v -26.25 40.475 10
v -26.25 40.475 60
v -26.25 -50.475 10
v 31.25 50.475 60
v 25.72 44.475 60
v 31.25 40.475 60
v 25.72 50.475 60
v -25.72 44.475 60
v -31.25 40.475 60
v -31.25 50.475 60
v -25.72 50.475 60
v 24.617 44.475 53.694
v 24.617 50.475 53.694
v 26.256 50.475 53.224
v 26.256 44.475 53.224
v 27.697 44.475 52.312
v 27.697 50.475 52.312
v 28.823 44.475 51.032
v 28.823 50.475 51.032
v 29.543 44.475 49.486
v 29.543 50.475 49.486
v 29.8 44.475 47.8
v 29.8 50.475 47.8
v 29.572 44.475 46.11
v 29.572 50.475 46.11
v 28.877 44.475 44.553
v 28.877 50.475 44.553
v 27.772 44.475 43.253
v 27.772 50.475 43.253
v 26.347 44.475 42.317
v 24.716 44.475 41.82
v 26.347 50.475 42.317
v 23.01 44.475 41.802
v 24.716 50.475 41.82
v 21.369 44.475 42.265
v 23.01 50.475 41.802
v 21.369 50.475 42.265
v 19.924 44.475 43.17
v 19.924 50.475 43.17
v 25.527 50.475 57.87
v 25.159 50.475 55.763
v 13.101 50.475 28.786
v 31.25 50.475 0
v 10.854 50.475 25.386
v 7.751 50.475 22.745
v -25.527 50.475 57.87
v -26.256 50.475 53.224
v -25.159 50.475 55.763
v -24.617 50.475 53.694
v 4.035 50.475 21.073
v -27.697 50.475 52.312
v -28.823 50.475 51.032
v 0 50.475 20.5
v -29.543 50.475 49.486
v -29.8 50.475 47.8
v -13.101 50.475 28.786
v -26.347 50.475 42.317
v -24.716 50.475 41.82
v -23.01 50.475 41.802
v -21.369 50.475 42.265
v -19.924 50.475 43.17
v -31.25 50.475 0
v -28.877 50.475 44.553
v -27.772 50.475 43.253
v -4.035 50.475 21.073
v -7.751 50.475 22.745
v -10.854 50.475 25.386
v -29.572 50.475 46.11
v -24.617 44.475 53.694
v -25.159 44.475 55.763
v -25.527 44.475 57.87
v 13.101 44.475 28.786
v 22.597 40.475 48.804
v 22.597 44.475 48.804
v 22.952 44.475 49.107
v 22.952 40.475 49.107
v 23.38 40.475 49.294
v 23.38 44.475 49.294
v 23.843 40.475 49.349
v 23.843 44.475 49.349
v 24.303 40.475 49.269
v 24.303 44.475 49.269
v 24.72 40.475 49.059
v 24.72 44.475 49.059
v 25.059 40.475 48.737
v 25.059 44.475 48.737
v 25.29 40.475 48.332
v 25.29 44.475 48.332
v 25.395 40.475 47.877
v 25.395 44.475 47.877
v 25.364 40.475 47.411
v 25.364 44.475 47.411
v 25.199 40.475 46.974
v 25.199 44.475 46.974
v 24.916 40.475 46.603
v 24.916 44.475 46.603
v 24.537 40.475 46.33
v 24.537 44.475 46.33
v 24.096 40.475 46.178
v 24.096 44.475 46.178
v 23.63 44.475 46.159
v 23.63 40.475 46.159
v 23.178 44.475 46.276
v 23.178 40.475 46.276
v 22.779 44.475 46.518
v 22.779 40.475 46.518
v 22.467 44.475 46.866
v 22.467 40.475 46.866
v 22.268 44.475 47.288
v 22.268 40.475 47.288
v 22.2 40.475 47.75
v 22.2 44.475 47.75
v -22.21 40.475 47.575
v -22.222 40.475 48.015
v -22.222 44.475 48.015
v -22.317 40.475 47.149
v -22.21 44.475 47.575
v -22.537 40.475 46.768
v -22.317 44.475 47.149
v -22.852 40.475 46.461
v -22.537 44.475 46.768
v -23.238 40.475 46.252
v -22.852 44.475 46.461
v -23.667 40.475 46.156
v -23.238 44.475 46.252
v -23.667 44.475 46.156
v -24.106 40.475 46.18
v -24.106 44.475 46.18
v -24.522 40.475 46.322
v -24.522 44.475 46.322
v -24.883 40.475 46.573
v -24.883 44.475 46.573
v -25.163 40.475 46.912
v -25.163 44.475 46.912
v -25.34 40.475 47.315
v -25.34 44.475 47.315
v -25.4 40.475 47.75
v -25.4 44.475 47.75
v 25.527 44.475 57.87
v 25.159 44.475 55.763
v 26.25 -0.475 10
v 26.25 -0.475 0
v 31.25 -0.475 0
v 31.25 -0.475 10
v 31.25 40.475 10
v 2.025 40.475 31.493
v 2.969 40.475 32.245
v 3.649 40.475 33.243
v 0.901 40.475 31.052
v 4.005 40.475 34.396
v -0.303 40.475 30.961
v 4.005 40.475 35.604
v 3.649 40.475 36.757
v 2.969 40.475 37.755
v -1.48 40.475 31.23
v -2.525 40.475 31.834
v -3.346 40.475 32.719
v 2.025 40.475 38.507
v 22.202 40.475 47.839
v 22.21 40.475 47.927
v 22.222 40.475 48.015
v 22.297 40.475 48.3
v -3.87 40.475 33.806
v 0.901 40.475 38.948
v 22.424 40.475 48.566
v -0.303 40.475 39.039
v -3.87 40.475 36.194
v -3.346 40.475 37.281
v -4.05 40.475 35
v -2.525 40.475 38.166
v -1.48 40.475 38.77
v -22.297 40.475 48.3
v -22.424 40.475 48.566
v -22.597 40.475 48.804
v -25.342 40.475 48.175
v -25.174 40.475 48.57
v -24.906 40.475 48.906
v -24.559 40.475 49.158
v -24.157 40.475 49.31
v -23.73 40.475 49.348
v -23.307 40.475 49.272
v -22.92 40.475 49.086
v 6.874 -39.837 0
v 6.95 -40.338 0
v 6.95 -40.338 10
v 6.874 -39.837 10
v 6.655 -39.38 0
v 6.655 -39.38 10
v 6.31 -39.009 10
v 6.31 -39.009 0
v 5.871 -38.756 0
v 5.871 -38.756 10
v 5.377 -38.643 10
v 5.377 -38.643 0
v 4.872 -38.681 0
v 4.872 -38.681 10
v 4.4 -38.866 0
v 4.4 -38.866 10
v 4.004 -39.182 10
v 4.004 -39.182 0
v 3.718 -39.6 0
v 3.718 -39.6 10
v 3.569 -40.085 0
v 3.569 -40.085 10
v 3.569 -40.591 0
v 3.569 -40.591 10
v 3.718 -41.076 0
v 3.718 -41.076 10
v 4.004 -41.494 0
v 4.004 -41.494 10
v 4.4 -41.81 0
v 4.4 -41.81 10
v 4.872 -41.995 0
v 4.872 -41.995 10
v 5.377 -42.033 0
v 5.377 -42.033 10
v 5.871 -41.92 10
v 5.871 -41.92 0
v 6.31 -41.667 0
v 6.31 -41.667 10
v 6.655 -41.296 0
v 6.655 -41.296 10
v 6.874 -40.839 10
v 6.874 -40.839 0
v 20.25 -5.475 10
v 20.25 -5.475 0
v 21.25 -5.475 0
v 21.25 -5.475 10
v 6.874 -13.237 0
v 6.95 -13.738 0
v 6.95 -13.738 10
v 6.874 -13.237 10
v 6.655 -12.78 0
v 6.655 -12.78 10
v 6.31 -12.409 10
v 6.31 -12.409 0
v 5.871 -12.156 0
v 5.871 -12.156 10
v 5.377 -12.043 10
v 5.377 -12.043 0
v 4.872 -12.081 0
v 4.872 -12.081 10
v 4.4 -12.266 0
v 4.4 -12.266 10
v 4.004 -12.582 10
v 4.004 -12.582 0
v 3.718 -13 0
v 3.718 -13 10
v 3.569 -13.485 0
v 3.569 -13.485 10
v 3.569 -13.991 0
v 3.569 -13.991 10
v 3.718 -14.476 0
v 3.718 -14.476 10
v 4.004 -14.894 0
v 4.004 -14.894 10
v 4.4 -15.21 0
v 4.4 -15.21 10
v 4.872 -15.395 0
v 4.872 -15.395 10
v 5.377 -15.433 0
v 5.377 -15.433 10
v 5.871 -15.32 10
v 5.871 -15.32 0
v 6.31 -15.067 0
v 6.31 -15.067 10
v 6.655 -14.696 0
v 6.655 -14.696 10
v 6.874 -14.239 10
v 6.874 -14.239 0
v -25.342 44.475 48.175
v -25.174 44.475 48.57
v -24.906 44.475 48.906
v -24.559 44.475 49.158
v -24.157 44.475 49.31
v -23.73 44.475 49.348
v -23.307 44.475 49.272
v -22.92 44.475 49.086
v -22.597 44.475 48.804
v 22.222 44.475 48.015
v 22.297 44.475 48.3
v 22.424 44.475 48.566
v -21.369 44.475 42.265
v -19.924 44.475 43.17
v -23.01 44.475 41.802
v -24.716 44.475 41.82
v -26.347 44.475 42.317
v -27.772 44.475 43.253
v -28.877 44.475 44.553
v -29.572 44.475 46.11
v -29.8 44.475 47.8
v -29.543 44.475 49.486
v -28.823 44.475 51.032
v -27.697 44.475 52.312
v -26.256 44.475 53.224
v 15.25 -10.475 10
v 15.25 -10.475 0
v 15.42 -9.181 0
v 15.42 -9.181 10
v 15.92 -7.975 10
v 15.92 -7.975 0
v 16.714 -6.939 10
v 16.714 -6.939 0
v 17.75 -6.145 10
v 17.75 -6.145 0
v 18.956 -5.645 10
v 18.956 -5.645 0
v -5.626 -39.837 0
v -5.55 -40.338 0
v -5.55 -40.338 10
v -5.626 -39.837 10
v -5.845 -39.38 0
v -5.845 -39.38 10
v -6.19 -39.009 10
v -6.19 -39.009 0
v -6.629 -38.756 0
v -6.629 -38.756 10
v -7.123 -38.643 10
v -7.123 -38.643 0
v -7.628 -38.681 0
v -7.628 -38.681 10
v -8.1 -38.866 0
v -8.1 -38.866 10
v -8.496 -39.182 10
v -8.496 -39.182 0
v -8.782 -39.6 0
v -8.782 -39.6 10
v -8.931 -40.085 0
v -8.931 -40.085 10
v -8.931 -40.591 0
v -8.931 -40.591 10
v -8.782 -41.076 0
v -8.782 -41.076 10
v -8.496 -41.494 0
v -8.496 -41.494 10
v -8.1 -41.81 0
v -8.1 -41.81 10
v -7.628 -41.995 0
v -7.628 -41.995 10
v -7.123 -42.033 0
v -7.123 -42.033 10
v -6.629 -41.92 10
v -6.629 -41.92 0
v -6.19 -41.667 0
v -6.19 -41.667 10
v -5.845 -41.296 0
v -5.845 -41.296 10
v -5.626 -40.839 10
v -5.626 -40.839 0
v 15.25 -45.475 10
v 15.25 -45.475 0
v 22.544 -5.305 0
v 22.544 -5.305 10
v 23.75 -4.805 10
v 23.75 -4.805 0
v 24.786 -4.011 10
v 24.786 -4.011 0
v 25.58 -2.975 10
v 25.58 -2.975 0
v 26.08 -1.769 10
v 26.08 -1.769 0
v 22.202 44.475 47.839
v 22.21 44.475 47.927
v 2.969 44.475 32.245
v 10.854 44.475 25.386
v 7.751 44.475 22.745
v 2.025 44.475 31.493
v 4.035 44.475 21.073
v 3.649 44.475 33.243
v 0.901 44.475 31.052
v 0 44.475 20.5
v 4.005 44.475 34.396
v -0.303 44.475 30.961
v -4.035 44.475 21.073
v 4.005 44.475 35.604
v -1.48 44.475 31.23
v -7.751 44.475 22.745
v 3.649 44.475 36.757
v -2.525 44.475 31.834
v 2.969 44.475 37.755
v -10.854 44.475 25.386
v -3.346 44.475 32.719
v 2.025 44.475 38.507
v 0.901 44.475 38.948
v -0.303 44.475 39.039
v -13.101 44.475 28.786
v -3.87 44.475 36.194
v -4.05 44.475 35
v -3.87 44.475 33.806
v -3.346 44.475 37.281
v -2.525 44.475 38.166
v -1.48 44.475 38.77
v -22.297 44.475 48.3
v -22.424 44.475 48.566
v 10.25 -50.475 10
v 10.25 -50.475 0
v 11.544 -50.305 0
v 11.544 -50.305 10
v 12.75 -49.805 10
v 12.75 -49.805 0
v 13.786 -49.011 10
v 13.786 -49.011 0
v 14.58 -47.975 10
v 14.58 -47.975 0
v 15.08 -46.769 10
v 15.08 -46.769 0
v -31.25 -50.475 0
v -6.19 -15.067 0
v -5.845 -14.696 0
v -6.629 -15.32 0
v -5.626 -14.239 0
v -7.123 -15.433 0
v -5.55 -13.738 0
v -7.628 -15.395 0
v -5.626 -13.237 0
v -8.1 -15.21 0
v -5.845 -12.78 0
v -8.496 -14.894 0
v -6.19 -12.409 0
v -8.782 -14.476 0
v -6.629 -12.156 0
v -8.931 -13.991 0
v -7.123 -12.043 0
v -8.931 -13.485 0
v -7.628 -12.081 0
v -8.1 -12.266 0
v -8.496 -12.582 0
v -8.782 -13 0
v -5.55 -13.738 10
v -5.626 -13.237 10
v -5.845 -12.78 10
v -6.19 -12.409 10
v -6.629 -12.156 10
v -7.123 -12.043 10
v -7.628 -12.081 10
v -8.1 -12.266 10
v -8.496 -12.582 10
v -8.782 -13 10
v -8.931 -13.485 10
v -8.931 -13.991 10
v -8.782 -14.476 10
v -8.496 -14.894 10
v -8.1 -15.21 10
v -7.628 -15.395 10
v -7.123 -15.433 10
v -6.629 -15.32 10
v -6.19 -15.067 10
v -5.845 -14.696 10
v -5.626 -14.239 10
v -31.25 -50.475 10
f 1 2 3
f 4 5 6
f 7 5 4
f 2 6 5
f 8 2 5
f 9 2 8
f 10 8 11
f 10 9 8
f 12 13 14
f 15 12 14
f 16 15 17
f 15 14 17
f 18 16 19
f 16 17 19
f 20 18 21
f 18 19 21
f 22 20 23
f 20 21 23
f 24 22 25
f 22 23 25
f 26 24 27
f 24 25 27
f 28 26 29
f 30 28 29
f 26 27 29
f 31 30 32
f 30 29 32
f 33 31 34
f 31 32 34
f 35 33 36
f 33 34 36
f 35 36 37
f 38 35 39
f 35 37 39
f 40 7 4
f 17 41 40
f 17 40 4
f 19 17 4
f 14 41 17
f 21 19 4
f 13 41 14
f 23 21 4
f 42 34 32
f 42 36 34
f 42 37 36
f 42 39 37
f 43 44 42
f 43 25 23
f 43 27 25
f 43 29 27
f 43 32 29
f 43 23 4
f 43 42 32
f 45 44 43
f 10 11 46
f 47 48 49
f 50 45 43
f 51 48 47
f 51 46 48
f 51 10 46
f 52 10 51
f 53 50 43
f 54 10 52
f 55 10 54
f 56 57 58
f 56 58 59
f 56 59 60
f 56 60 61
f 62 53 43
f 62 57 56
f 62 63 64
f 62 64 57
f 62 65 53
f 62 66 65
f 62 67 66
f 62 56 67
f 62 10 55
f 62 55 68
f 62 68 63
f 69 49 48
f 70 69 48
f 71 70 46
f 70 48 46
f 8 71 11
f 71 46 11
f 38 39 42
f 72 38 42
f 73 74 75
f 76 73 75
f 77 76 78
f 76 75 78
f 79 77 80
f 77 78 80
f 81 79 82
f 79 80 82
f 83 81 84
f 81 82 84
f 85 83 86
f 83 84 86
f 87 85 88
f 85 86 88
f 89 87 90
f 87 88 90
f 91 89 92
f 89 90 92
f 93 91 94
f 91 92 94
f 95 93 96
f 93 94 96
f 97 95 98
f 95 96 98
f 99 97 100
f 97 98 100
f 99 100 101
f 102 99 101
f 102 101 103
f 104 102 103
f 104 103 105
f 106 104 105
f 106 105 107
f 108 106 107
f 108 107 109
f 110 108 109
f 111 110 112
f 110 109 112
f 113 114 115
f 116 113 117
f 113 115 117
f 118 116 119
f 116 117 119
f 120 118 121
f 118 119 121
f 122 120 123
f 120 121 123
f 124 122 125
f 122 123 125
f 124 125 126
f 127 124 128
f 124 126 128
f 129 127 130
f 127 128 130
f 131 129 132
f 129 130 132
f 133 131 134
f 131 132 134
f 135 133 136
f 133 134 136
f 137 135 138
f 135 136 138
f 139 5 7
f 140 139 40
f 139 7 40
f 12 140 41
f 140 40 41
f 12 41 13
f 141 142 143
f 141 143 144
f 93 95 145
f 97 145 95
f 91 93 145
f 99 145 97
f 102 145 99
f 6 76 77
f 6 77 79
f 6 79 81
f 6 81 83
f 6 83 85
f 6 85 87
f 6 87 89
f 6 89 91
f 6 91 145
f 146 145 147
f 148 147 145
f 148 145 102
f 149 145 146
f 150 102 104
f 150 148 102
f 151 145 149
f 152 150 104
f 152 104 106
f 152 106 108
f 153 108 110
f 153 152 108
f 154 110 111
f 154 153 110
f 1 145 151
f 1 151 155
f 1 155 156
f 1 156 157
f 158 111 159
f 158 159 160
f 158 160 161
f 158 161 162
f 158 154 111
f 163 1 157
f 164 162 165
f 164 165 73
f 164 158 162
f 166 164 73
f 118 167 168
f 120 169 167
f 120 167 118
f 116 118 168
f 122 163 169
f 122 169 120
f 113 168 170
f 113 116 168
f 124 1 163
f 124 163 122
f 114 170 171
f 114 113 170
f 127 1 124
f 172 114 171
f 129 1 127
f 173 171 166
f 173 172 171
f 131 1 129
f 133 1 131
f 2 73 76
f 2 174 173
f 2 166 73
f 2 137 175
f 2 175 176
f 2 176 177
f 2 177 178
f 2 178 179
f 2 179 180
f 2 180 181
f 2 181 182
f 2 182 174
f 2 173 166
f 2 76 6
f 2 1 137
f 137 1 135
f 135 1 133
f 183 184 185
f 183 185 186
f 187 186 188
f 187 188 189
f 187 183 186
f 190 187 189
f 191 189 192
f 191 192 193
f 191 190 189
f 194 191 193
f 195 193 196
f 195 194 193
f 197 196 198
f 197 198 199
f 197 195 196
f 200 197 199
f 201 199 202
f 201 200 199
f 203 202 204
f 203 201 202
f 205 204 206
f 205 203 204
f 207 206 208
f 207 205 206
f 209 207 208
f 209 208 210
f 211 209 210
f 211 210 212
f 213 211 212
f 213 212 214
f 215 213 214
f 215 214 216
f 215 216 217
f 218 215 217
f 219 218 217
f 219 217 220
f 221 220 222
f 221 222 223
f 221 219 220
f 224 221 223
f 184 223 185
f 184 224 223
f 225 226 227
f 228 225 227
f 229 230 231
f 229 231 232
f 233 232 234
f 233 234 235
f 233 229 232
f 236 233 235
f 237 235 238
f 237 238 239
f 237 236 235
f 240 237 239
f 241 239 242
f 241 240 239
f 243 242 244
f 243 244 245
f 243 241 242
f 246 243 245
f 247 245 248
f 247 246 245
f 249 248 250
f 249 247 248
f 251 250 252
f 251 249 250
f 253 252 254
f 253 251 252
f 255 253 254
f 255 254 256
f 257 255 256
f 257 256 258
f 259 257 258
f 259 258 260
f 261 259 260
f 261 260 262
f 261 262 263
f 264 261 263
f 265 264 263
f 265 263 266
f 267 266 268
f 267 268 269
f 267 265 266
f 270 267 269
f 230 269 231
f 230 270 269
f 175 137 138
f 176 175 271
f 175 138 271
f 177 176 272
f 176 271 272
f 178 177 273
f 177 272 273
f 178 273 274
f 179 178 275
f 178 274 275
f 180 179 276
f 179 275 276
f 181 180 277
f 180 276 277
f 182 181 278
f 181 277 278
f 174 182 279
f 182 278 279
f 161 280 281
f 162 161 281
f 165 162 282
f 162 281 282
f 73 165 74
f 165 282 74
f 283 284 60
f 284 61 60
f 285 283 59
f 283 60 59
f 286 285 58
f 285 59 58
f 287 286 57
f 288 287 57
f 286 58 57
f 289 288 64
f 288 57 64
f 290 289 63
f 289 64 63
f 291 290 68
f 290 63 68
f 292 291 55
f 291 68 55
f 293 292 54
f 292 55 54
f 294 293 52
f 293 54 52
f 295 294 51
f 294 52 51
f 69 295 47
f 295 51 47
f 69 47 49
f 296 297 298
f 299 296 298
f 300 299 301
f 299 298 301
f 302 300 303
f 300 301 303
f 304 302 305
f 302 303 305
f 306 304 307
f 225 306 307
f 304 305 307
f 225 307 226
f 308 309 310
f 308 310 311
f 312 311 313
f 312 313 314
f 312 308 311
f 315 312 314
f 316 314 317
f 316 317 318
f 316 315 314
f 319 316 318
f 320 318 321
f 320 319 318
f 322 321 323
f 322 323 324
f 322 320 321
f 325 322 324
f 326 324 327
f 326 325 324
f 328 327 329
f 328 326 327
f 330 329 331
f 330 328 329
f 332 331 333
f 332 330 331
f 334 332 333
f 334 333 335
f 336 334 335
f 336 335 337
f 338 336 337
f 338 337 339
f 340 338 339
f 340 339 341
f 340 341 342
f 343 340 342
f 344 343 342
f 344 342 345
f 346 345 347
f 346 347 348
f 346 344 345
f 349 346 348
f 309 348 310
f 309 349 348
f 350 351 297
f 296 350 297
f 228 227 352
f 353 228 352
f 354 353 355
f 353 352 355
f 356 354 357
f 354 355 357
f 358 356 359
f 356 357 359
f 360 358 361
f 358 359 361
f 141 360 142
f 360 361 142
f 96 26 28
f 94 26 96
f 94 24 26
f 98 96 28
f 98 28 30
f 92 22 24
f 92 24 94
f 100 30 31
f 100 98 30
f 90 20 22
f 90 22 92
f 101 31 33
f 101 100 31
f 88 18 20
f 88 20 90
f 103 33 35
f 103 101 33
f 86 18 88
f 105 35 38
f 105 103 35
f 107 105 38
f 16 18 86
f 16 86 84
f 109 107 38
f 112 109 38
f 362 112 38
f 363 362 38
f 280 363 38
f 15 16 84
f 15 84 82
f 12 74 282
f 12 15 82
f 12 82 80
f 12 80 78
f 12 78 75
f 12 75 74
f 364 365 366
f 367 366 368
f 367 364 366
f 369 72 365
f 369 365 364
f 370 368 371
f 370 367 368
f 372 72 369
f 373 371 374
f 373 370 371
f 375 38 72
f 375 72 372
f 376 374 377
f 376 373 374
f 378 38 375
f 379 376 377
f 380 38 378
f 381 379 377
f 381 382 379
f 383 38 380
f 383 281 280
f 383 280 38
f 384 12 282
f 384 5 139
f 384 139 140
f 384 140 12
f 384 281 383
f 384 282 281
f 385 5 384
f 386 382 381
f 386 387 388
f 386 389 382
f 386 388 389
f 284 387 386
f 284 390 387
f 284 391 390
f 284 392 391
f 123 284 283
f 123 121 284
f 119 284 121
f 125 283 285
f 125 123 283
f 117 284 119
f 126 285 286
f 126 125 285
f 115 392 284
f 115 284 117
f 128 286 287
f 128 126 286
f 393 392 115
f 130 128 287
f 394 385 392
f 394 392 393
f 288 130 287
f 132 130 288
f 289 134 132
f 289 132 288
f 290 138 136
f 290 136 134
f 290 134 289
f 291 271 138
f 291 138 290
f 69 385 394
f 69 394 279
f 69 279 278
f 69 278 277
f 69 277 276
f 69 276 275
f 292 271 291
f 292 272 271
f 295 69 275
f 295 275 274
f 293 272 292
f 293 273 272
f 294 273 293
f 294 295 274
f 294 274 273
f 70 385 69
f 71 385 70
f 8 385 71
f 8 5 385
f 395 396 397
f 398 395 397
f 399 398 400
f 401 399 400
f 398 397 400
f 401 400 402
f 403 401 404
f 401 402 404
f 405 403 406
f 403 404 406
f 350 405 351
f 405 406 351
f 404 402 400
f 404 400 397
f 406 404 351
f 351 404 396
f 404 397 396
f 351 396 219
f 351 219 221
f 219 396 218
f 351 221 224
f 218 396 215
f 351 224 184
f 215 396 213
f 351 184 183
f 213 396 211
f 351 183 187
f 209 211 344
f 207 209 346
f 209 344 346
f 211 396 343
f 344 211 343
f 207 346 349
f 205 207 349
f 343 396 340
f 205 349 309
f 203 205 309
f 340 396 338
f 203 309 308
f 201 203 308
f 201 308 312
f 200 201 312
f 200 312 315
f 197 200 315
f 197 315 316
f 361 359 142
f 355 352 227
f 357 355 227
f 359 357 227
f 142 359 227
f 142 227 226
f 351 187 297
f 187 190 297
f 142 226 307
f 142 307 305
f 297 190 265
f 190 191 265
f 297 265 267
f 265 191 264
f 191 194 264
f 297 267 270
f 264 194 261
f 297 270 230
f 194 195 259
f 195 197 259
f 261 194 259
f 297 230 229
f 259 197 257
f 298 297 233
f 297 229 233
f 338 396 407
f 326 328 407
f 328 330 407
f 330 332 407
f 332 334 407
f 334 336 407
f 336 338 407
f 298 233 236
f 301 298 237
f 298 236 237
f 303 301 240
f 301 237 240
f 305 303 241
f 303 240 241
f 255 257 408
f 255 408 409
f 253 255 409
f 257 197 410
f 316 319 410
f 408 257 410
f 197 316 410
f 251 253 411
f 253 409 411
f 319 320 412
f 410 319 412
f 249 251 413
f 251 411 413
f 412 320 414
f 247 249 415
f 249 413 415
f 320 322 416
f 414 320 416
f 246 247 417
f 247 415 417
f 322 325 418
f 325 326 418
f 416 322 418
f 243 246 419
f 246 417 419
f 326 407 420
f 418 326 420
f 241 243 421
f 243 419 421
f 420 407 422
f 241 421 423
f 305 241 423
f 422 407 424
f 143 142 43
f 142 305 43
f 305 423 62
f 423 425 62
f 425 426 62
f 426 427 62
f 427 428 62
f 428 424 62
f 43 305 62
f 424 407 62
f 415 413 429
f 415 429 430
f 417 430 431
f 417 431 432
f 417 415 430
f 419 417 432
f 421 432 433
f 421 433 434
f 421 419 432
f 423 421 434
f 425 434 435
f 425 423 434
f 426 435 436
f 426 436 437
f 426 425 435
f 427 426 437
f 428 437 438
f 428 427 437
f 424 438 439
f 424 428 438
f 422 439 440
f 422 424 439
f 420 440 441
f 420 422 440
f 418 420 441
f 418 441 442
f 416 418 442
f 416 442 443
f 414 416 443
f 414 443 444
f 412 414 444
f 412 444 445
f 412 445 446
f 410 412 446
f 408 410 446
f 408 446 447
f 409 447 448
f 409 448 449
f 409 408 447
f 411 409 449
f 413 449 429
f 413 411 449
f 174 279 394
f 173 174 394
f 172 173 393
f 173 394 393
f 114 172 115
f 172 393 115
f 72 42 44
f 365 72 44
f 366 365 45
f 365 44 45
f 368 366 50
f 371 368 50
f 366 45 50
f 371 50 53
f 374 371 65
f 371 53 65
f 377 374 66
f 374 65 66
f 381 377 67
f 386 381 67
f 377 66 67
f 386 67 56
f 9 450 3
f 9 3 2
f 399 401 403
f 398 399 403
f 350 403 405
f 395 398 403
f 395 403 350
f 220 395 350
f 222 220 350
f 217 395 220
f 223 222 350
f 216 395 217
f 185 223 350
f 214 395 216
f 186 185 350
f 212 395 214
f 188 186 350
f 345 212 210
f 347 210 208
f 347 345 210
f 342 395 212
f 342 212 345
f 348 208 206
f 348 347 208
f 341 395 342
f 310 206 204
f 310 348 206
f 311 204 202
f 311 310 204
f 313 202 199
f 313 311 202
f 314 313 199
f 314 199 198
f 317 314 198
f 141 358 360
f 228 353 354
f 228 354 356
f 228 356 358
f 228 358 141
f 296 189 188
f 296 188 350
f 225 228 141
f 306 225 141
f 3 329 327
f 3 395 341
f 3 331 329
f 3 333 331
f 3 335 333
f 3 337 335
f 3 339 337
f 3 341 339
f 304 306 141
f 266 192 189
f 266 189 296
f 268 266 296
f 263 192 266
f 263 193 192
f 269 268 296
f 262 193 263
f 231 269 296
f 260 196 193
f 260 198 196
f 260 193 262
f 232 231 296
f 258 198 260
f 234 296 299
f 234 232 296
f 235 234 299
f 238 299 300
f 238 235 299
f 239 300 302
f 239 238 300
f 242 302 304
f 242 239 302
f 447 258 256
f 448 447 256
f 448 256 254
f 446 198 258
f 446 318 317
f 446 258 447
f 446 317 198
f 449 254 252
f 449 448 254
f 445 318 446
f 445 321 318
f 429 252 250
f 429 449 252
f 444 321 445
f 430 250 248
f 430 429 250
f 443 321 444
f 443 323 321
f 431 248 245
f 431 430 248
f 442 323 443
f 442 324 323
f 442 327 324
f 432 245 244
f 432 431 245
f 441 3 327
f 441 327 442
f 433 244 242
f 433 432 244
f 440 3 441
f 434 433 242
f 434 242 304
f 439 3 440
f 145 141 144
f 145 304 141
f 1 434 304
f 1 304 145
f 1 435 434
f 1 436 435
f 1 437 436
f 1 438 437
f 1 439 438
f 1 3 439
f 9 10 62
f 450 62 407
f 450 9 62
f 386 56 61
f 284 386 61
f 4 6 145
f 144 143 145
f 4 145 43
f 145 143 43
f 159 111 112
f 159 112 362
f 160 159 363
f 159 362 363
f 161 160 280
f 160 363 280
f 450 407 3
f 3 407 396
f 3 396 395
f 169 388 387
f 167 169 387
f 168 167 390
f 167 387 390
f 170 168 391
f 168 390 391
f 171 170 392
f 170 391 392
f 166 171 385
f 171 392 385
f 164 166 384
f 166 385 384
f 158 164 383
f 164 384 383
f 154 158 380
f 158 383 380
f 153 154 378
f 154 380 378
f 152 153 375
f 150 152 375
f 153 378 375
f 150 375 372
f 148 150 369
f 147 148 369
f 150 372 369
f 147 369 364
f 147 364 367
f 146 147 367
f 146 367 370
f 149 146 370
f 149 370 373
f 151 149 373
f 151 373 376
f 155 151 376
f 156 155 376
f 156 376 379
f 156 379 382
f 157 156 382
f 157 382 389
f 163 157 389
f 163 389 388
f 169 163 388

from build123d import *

# Parameters (mm, degrees)
F0_R            = 1.7
F1_DEPTH        = 10
F3_DEPTH        = 50
F4_R            = 4.05
F5_DEPTH        = 6
F6_R            = 4.05
F7_DEPTH        = 25
F8_DEPTH        = 5
F9_DEPTH        = 5
F11_DEPTH       = 5
F13_D           = 3.2
F13_CBORE_D     = 12
F13_CBORE_DEPTH = 6


with BuildPart() as f1:
    # F0 (on Top) → F1 (new body)
    with BuildSketch(Plane.XY):
        with BuildLine():
            Line((26.25, 50.475), (-26.25, 50.475))
            Line((-26.25, 50.475), (-26.25, -50.475))
            Line((-26.25, -50.475), (10.25, -50.475))
            ThreePointArc((10.25, -50.475), (13.7855339059, -49.0105339059), (15.25, -45.475))
            Line((15.25, -45.475), (15.25, -10.475))
            ThreePointArc((15.25, -10.475), (16.7144660941, -6.9394660941), (20.25, -5.475))
            Line((20.25, -5.475), (21.25, -5.475))
            ThreePointArc((21.25, -5.475), (24.7855339059, -4.0105339059), (26.25, -0.475))
            Line((26.25, -0.475), (26.25, 50.475))
        make_face()
        with Locations((-7.25, -40.338)):
            Circle(F0_R, mode=Mode.SUBTRACT)
        with Locations((-7.25, -13.738)):
            Circle(F0_R, mode=Mode.SUBTRACT)
        with Locations((5.25, -40.338)):
            Circle(F0_R, mode=Mode.SUBTRACT)
        with Locations((5.25, -13.738)):
            Circle(F0_R, mode=Mode.SUBTRACT)
    extrude(amount=F1_DEPTH)

    # F2 (on face) → F3 (join)
    with BuildSketch(Plane.XY.offset(10)):
        Polygon((26.25, 50.475), (-26.25, 50.475), (-26.25, 40.475), (-21.25, 40.475), (26.25, 40.475), align=None)
    extrude(amount=F3_DEPTH)

    # F4 (on face) → F5 (cut)
    with BuildSketch(Plane(origin=(0, 50.475, 0), x_dir=(-1, 0, 0), z_dir=(0, 1, 0))):
        with BuildLine():
            Line((13.1008645921, 28.7857142857), (23.2653284998, 50.2142857143))
            ThreePointArc((23.2653284998, 50.2142857143), (24.9764267273, 54.9857675702), (25.7196422992, 60))
            Line((25.7196422992, 60), (-25.7196422992, 60))
            ThreePointArc((-25.7196422992, 60), (-24.9764267273, 54.9857675702), (-23.2653284998, 50.2142857143))
            Line((-23.2653284998, 50.2142857143), (-13.1008645921, 28.7857142857))
            ThreePointArc((-13.1008645921, 28.7857142857), (0, 20.5), (13.1008645921, 28.7857142857))
        make_face()
        with Locations((0, 35)):
            Circle(F4_R, mode=Mode.SUBTRACT)
        with Locations((0, 35)):
            Circle(F4_R)
    extrude(amount=-F5_DEPTH, mode=Mode.SUBTRACT)

    # F6 (on face) → F7 (cut)
    with BuildSketch(Plane(origin=(0, 50.475, 0), x_dir=(-1, 0, 0), z_dir=(0, 1, 0))):
        with Locations((0, 35)):
            Circle(F6_R)
        with BuildLine():
            Line((-22.5965488101, 48.8043743327), (-22.2220881702, 48.0149419886))
            ThreePointArc((-22.2220881702, 48.0149419886), (-22.3543873554, 48.4357142857), (-22.5965488101, 48.8043743327))
        make_face()
        with BuildLine():
            ThreePointArc((-22.5965488101, 48.8043743327), (-25.29758504, 47.1867602215), (-22.2, 47.75))
            ThreePointArc((-22.2, 47.75), (-22.2055316046, 47.8829305689), (-22.2220881702, 48.0149419886))
            Line((-22.2220881702, 48.0149419886), (-22.5965488101, 48.8043743327))
        make_face()
        with BuildLine():
            ThreePointArc((22.5965488101, 48.8043743327), (22.3543873554, 48.4357142857), (22.2220881702, 48.0149419886))
            Line((22.2220881702, 48.0149419886), (22.5965488101, 48.8043743327))
        make_face()
        with BuildLine():
            Line((22.5965488101, 48.8043743327), (22.2220881702, 48.0149419886))
            ThreePointArc((22.2220881702, 48.0149419886), (23.6670694311, 46.1555316046), (25.4, 47.75))
            ThreePointArc((25.4, 47.75), (24.3632397785, 49.24758504), (22.5965488101, 48.8043743327))
        make_face()
    extrude(amount=-F7_DEPTH, mode=Mode.SUBTRACT)

    # F8 (add): a face of the model
    f8_faces = [f1.faces().sort_by_distance(p)[0] for p in [
        (-26.25, 49.3006532667, 30),
    ]]
    extrude(f8_faces, amount=F8_DEPTH)

    # F9 (add): a face of the model
    f9_faces = [f1.faces().sort_by_distance(p)[0] for p in [
        (26.25, 0.3121405529, 5),
    ]]
    extrude(f9_faces, amount=F9_DEPTH)

    # F10 (on face) → F11 (join)
    with BuildSketch(Plane(origin=(-31.25, 0, 0), x_dir=(0, -1, 0), z_dir=(-1, 0, 0))):
        Polygon((50.475, 10), (-40.475, 60), (-40.475, 10), align=None)
    extrude(amount=-F11_DEPTH)

    # F13 (through all)
    with Locations(Plane(origin=(0, 50.475, 0), x_dir=(-1, 0, 0), z_dir=(0, 1, 0))):
        with Locations((-23.8, 47.75), (23.8, 47.75)):
            CounterBoreHole(F13_D / 2, F13_CBORE_D / 2, F13_CBORE_DEPTH)


solid = f1.part
